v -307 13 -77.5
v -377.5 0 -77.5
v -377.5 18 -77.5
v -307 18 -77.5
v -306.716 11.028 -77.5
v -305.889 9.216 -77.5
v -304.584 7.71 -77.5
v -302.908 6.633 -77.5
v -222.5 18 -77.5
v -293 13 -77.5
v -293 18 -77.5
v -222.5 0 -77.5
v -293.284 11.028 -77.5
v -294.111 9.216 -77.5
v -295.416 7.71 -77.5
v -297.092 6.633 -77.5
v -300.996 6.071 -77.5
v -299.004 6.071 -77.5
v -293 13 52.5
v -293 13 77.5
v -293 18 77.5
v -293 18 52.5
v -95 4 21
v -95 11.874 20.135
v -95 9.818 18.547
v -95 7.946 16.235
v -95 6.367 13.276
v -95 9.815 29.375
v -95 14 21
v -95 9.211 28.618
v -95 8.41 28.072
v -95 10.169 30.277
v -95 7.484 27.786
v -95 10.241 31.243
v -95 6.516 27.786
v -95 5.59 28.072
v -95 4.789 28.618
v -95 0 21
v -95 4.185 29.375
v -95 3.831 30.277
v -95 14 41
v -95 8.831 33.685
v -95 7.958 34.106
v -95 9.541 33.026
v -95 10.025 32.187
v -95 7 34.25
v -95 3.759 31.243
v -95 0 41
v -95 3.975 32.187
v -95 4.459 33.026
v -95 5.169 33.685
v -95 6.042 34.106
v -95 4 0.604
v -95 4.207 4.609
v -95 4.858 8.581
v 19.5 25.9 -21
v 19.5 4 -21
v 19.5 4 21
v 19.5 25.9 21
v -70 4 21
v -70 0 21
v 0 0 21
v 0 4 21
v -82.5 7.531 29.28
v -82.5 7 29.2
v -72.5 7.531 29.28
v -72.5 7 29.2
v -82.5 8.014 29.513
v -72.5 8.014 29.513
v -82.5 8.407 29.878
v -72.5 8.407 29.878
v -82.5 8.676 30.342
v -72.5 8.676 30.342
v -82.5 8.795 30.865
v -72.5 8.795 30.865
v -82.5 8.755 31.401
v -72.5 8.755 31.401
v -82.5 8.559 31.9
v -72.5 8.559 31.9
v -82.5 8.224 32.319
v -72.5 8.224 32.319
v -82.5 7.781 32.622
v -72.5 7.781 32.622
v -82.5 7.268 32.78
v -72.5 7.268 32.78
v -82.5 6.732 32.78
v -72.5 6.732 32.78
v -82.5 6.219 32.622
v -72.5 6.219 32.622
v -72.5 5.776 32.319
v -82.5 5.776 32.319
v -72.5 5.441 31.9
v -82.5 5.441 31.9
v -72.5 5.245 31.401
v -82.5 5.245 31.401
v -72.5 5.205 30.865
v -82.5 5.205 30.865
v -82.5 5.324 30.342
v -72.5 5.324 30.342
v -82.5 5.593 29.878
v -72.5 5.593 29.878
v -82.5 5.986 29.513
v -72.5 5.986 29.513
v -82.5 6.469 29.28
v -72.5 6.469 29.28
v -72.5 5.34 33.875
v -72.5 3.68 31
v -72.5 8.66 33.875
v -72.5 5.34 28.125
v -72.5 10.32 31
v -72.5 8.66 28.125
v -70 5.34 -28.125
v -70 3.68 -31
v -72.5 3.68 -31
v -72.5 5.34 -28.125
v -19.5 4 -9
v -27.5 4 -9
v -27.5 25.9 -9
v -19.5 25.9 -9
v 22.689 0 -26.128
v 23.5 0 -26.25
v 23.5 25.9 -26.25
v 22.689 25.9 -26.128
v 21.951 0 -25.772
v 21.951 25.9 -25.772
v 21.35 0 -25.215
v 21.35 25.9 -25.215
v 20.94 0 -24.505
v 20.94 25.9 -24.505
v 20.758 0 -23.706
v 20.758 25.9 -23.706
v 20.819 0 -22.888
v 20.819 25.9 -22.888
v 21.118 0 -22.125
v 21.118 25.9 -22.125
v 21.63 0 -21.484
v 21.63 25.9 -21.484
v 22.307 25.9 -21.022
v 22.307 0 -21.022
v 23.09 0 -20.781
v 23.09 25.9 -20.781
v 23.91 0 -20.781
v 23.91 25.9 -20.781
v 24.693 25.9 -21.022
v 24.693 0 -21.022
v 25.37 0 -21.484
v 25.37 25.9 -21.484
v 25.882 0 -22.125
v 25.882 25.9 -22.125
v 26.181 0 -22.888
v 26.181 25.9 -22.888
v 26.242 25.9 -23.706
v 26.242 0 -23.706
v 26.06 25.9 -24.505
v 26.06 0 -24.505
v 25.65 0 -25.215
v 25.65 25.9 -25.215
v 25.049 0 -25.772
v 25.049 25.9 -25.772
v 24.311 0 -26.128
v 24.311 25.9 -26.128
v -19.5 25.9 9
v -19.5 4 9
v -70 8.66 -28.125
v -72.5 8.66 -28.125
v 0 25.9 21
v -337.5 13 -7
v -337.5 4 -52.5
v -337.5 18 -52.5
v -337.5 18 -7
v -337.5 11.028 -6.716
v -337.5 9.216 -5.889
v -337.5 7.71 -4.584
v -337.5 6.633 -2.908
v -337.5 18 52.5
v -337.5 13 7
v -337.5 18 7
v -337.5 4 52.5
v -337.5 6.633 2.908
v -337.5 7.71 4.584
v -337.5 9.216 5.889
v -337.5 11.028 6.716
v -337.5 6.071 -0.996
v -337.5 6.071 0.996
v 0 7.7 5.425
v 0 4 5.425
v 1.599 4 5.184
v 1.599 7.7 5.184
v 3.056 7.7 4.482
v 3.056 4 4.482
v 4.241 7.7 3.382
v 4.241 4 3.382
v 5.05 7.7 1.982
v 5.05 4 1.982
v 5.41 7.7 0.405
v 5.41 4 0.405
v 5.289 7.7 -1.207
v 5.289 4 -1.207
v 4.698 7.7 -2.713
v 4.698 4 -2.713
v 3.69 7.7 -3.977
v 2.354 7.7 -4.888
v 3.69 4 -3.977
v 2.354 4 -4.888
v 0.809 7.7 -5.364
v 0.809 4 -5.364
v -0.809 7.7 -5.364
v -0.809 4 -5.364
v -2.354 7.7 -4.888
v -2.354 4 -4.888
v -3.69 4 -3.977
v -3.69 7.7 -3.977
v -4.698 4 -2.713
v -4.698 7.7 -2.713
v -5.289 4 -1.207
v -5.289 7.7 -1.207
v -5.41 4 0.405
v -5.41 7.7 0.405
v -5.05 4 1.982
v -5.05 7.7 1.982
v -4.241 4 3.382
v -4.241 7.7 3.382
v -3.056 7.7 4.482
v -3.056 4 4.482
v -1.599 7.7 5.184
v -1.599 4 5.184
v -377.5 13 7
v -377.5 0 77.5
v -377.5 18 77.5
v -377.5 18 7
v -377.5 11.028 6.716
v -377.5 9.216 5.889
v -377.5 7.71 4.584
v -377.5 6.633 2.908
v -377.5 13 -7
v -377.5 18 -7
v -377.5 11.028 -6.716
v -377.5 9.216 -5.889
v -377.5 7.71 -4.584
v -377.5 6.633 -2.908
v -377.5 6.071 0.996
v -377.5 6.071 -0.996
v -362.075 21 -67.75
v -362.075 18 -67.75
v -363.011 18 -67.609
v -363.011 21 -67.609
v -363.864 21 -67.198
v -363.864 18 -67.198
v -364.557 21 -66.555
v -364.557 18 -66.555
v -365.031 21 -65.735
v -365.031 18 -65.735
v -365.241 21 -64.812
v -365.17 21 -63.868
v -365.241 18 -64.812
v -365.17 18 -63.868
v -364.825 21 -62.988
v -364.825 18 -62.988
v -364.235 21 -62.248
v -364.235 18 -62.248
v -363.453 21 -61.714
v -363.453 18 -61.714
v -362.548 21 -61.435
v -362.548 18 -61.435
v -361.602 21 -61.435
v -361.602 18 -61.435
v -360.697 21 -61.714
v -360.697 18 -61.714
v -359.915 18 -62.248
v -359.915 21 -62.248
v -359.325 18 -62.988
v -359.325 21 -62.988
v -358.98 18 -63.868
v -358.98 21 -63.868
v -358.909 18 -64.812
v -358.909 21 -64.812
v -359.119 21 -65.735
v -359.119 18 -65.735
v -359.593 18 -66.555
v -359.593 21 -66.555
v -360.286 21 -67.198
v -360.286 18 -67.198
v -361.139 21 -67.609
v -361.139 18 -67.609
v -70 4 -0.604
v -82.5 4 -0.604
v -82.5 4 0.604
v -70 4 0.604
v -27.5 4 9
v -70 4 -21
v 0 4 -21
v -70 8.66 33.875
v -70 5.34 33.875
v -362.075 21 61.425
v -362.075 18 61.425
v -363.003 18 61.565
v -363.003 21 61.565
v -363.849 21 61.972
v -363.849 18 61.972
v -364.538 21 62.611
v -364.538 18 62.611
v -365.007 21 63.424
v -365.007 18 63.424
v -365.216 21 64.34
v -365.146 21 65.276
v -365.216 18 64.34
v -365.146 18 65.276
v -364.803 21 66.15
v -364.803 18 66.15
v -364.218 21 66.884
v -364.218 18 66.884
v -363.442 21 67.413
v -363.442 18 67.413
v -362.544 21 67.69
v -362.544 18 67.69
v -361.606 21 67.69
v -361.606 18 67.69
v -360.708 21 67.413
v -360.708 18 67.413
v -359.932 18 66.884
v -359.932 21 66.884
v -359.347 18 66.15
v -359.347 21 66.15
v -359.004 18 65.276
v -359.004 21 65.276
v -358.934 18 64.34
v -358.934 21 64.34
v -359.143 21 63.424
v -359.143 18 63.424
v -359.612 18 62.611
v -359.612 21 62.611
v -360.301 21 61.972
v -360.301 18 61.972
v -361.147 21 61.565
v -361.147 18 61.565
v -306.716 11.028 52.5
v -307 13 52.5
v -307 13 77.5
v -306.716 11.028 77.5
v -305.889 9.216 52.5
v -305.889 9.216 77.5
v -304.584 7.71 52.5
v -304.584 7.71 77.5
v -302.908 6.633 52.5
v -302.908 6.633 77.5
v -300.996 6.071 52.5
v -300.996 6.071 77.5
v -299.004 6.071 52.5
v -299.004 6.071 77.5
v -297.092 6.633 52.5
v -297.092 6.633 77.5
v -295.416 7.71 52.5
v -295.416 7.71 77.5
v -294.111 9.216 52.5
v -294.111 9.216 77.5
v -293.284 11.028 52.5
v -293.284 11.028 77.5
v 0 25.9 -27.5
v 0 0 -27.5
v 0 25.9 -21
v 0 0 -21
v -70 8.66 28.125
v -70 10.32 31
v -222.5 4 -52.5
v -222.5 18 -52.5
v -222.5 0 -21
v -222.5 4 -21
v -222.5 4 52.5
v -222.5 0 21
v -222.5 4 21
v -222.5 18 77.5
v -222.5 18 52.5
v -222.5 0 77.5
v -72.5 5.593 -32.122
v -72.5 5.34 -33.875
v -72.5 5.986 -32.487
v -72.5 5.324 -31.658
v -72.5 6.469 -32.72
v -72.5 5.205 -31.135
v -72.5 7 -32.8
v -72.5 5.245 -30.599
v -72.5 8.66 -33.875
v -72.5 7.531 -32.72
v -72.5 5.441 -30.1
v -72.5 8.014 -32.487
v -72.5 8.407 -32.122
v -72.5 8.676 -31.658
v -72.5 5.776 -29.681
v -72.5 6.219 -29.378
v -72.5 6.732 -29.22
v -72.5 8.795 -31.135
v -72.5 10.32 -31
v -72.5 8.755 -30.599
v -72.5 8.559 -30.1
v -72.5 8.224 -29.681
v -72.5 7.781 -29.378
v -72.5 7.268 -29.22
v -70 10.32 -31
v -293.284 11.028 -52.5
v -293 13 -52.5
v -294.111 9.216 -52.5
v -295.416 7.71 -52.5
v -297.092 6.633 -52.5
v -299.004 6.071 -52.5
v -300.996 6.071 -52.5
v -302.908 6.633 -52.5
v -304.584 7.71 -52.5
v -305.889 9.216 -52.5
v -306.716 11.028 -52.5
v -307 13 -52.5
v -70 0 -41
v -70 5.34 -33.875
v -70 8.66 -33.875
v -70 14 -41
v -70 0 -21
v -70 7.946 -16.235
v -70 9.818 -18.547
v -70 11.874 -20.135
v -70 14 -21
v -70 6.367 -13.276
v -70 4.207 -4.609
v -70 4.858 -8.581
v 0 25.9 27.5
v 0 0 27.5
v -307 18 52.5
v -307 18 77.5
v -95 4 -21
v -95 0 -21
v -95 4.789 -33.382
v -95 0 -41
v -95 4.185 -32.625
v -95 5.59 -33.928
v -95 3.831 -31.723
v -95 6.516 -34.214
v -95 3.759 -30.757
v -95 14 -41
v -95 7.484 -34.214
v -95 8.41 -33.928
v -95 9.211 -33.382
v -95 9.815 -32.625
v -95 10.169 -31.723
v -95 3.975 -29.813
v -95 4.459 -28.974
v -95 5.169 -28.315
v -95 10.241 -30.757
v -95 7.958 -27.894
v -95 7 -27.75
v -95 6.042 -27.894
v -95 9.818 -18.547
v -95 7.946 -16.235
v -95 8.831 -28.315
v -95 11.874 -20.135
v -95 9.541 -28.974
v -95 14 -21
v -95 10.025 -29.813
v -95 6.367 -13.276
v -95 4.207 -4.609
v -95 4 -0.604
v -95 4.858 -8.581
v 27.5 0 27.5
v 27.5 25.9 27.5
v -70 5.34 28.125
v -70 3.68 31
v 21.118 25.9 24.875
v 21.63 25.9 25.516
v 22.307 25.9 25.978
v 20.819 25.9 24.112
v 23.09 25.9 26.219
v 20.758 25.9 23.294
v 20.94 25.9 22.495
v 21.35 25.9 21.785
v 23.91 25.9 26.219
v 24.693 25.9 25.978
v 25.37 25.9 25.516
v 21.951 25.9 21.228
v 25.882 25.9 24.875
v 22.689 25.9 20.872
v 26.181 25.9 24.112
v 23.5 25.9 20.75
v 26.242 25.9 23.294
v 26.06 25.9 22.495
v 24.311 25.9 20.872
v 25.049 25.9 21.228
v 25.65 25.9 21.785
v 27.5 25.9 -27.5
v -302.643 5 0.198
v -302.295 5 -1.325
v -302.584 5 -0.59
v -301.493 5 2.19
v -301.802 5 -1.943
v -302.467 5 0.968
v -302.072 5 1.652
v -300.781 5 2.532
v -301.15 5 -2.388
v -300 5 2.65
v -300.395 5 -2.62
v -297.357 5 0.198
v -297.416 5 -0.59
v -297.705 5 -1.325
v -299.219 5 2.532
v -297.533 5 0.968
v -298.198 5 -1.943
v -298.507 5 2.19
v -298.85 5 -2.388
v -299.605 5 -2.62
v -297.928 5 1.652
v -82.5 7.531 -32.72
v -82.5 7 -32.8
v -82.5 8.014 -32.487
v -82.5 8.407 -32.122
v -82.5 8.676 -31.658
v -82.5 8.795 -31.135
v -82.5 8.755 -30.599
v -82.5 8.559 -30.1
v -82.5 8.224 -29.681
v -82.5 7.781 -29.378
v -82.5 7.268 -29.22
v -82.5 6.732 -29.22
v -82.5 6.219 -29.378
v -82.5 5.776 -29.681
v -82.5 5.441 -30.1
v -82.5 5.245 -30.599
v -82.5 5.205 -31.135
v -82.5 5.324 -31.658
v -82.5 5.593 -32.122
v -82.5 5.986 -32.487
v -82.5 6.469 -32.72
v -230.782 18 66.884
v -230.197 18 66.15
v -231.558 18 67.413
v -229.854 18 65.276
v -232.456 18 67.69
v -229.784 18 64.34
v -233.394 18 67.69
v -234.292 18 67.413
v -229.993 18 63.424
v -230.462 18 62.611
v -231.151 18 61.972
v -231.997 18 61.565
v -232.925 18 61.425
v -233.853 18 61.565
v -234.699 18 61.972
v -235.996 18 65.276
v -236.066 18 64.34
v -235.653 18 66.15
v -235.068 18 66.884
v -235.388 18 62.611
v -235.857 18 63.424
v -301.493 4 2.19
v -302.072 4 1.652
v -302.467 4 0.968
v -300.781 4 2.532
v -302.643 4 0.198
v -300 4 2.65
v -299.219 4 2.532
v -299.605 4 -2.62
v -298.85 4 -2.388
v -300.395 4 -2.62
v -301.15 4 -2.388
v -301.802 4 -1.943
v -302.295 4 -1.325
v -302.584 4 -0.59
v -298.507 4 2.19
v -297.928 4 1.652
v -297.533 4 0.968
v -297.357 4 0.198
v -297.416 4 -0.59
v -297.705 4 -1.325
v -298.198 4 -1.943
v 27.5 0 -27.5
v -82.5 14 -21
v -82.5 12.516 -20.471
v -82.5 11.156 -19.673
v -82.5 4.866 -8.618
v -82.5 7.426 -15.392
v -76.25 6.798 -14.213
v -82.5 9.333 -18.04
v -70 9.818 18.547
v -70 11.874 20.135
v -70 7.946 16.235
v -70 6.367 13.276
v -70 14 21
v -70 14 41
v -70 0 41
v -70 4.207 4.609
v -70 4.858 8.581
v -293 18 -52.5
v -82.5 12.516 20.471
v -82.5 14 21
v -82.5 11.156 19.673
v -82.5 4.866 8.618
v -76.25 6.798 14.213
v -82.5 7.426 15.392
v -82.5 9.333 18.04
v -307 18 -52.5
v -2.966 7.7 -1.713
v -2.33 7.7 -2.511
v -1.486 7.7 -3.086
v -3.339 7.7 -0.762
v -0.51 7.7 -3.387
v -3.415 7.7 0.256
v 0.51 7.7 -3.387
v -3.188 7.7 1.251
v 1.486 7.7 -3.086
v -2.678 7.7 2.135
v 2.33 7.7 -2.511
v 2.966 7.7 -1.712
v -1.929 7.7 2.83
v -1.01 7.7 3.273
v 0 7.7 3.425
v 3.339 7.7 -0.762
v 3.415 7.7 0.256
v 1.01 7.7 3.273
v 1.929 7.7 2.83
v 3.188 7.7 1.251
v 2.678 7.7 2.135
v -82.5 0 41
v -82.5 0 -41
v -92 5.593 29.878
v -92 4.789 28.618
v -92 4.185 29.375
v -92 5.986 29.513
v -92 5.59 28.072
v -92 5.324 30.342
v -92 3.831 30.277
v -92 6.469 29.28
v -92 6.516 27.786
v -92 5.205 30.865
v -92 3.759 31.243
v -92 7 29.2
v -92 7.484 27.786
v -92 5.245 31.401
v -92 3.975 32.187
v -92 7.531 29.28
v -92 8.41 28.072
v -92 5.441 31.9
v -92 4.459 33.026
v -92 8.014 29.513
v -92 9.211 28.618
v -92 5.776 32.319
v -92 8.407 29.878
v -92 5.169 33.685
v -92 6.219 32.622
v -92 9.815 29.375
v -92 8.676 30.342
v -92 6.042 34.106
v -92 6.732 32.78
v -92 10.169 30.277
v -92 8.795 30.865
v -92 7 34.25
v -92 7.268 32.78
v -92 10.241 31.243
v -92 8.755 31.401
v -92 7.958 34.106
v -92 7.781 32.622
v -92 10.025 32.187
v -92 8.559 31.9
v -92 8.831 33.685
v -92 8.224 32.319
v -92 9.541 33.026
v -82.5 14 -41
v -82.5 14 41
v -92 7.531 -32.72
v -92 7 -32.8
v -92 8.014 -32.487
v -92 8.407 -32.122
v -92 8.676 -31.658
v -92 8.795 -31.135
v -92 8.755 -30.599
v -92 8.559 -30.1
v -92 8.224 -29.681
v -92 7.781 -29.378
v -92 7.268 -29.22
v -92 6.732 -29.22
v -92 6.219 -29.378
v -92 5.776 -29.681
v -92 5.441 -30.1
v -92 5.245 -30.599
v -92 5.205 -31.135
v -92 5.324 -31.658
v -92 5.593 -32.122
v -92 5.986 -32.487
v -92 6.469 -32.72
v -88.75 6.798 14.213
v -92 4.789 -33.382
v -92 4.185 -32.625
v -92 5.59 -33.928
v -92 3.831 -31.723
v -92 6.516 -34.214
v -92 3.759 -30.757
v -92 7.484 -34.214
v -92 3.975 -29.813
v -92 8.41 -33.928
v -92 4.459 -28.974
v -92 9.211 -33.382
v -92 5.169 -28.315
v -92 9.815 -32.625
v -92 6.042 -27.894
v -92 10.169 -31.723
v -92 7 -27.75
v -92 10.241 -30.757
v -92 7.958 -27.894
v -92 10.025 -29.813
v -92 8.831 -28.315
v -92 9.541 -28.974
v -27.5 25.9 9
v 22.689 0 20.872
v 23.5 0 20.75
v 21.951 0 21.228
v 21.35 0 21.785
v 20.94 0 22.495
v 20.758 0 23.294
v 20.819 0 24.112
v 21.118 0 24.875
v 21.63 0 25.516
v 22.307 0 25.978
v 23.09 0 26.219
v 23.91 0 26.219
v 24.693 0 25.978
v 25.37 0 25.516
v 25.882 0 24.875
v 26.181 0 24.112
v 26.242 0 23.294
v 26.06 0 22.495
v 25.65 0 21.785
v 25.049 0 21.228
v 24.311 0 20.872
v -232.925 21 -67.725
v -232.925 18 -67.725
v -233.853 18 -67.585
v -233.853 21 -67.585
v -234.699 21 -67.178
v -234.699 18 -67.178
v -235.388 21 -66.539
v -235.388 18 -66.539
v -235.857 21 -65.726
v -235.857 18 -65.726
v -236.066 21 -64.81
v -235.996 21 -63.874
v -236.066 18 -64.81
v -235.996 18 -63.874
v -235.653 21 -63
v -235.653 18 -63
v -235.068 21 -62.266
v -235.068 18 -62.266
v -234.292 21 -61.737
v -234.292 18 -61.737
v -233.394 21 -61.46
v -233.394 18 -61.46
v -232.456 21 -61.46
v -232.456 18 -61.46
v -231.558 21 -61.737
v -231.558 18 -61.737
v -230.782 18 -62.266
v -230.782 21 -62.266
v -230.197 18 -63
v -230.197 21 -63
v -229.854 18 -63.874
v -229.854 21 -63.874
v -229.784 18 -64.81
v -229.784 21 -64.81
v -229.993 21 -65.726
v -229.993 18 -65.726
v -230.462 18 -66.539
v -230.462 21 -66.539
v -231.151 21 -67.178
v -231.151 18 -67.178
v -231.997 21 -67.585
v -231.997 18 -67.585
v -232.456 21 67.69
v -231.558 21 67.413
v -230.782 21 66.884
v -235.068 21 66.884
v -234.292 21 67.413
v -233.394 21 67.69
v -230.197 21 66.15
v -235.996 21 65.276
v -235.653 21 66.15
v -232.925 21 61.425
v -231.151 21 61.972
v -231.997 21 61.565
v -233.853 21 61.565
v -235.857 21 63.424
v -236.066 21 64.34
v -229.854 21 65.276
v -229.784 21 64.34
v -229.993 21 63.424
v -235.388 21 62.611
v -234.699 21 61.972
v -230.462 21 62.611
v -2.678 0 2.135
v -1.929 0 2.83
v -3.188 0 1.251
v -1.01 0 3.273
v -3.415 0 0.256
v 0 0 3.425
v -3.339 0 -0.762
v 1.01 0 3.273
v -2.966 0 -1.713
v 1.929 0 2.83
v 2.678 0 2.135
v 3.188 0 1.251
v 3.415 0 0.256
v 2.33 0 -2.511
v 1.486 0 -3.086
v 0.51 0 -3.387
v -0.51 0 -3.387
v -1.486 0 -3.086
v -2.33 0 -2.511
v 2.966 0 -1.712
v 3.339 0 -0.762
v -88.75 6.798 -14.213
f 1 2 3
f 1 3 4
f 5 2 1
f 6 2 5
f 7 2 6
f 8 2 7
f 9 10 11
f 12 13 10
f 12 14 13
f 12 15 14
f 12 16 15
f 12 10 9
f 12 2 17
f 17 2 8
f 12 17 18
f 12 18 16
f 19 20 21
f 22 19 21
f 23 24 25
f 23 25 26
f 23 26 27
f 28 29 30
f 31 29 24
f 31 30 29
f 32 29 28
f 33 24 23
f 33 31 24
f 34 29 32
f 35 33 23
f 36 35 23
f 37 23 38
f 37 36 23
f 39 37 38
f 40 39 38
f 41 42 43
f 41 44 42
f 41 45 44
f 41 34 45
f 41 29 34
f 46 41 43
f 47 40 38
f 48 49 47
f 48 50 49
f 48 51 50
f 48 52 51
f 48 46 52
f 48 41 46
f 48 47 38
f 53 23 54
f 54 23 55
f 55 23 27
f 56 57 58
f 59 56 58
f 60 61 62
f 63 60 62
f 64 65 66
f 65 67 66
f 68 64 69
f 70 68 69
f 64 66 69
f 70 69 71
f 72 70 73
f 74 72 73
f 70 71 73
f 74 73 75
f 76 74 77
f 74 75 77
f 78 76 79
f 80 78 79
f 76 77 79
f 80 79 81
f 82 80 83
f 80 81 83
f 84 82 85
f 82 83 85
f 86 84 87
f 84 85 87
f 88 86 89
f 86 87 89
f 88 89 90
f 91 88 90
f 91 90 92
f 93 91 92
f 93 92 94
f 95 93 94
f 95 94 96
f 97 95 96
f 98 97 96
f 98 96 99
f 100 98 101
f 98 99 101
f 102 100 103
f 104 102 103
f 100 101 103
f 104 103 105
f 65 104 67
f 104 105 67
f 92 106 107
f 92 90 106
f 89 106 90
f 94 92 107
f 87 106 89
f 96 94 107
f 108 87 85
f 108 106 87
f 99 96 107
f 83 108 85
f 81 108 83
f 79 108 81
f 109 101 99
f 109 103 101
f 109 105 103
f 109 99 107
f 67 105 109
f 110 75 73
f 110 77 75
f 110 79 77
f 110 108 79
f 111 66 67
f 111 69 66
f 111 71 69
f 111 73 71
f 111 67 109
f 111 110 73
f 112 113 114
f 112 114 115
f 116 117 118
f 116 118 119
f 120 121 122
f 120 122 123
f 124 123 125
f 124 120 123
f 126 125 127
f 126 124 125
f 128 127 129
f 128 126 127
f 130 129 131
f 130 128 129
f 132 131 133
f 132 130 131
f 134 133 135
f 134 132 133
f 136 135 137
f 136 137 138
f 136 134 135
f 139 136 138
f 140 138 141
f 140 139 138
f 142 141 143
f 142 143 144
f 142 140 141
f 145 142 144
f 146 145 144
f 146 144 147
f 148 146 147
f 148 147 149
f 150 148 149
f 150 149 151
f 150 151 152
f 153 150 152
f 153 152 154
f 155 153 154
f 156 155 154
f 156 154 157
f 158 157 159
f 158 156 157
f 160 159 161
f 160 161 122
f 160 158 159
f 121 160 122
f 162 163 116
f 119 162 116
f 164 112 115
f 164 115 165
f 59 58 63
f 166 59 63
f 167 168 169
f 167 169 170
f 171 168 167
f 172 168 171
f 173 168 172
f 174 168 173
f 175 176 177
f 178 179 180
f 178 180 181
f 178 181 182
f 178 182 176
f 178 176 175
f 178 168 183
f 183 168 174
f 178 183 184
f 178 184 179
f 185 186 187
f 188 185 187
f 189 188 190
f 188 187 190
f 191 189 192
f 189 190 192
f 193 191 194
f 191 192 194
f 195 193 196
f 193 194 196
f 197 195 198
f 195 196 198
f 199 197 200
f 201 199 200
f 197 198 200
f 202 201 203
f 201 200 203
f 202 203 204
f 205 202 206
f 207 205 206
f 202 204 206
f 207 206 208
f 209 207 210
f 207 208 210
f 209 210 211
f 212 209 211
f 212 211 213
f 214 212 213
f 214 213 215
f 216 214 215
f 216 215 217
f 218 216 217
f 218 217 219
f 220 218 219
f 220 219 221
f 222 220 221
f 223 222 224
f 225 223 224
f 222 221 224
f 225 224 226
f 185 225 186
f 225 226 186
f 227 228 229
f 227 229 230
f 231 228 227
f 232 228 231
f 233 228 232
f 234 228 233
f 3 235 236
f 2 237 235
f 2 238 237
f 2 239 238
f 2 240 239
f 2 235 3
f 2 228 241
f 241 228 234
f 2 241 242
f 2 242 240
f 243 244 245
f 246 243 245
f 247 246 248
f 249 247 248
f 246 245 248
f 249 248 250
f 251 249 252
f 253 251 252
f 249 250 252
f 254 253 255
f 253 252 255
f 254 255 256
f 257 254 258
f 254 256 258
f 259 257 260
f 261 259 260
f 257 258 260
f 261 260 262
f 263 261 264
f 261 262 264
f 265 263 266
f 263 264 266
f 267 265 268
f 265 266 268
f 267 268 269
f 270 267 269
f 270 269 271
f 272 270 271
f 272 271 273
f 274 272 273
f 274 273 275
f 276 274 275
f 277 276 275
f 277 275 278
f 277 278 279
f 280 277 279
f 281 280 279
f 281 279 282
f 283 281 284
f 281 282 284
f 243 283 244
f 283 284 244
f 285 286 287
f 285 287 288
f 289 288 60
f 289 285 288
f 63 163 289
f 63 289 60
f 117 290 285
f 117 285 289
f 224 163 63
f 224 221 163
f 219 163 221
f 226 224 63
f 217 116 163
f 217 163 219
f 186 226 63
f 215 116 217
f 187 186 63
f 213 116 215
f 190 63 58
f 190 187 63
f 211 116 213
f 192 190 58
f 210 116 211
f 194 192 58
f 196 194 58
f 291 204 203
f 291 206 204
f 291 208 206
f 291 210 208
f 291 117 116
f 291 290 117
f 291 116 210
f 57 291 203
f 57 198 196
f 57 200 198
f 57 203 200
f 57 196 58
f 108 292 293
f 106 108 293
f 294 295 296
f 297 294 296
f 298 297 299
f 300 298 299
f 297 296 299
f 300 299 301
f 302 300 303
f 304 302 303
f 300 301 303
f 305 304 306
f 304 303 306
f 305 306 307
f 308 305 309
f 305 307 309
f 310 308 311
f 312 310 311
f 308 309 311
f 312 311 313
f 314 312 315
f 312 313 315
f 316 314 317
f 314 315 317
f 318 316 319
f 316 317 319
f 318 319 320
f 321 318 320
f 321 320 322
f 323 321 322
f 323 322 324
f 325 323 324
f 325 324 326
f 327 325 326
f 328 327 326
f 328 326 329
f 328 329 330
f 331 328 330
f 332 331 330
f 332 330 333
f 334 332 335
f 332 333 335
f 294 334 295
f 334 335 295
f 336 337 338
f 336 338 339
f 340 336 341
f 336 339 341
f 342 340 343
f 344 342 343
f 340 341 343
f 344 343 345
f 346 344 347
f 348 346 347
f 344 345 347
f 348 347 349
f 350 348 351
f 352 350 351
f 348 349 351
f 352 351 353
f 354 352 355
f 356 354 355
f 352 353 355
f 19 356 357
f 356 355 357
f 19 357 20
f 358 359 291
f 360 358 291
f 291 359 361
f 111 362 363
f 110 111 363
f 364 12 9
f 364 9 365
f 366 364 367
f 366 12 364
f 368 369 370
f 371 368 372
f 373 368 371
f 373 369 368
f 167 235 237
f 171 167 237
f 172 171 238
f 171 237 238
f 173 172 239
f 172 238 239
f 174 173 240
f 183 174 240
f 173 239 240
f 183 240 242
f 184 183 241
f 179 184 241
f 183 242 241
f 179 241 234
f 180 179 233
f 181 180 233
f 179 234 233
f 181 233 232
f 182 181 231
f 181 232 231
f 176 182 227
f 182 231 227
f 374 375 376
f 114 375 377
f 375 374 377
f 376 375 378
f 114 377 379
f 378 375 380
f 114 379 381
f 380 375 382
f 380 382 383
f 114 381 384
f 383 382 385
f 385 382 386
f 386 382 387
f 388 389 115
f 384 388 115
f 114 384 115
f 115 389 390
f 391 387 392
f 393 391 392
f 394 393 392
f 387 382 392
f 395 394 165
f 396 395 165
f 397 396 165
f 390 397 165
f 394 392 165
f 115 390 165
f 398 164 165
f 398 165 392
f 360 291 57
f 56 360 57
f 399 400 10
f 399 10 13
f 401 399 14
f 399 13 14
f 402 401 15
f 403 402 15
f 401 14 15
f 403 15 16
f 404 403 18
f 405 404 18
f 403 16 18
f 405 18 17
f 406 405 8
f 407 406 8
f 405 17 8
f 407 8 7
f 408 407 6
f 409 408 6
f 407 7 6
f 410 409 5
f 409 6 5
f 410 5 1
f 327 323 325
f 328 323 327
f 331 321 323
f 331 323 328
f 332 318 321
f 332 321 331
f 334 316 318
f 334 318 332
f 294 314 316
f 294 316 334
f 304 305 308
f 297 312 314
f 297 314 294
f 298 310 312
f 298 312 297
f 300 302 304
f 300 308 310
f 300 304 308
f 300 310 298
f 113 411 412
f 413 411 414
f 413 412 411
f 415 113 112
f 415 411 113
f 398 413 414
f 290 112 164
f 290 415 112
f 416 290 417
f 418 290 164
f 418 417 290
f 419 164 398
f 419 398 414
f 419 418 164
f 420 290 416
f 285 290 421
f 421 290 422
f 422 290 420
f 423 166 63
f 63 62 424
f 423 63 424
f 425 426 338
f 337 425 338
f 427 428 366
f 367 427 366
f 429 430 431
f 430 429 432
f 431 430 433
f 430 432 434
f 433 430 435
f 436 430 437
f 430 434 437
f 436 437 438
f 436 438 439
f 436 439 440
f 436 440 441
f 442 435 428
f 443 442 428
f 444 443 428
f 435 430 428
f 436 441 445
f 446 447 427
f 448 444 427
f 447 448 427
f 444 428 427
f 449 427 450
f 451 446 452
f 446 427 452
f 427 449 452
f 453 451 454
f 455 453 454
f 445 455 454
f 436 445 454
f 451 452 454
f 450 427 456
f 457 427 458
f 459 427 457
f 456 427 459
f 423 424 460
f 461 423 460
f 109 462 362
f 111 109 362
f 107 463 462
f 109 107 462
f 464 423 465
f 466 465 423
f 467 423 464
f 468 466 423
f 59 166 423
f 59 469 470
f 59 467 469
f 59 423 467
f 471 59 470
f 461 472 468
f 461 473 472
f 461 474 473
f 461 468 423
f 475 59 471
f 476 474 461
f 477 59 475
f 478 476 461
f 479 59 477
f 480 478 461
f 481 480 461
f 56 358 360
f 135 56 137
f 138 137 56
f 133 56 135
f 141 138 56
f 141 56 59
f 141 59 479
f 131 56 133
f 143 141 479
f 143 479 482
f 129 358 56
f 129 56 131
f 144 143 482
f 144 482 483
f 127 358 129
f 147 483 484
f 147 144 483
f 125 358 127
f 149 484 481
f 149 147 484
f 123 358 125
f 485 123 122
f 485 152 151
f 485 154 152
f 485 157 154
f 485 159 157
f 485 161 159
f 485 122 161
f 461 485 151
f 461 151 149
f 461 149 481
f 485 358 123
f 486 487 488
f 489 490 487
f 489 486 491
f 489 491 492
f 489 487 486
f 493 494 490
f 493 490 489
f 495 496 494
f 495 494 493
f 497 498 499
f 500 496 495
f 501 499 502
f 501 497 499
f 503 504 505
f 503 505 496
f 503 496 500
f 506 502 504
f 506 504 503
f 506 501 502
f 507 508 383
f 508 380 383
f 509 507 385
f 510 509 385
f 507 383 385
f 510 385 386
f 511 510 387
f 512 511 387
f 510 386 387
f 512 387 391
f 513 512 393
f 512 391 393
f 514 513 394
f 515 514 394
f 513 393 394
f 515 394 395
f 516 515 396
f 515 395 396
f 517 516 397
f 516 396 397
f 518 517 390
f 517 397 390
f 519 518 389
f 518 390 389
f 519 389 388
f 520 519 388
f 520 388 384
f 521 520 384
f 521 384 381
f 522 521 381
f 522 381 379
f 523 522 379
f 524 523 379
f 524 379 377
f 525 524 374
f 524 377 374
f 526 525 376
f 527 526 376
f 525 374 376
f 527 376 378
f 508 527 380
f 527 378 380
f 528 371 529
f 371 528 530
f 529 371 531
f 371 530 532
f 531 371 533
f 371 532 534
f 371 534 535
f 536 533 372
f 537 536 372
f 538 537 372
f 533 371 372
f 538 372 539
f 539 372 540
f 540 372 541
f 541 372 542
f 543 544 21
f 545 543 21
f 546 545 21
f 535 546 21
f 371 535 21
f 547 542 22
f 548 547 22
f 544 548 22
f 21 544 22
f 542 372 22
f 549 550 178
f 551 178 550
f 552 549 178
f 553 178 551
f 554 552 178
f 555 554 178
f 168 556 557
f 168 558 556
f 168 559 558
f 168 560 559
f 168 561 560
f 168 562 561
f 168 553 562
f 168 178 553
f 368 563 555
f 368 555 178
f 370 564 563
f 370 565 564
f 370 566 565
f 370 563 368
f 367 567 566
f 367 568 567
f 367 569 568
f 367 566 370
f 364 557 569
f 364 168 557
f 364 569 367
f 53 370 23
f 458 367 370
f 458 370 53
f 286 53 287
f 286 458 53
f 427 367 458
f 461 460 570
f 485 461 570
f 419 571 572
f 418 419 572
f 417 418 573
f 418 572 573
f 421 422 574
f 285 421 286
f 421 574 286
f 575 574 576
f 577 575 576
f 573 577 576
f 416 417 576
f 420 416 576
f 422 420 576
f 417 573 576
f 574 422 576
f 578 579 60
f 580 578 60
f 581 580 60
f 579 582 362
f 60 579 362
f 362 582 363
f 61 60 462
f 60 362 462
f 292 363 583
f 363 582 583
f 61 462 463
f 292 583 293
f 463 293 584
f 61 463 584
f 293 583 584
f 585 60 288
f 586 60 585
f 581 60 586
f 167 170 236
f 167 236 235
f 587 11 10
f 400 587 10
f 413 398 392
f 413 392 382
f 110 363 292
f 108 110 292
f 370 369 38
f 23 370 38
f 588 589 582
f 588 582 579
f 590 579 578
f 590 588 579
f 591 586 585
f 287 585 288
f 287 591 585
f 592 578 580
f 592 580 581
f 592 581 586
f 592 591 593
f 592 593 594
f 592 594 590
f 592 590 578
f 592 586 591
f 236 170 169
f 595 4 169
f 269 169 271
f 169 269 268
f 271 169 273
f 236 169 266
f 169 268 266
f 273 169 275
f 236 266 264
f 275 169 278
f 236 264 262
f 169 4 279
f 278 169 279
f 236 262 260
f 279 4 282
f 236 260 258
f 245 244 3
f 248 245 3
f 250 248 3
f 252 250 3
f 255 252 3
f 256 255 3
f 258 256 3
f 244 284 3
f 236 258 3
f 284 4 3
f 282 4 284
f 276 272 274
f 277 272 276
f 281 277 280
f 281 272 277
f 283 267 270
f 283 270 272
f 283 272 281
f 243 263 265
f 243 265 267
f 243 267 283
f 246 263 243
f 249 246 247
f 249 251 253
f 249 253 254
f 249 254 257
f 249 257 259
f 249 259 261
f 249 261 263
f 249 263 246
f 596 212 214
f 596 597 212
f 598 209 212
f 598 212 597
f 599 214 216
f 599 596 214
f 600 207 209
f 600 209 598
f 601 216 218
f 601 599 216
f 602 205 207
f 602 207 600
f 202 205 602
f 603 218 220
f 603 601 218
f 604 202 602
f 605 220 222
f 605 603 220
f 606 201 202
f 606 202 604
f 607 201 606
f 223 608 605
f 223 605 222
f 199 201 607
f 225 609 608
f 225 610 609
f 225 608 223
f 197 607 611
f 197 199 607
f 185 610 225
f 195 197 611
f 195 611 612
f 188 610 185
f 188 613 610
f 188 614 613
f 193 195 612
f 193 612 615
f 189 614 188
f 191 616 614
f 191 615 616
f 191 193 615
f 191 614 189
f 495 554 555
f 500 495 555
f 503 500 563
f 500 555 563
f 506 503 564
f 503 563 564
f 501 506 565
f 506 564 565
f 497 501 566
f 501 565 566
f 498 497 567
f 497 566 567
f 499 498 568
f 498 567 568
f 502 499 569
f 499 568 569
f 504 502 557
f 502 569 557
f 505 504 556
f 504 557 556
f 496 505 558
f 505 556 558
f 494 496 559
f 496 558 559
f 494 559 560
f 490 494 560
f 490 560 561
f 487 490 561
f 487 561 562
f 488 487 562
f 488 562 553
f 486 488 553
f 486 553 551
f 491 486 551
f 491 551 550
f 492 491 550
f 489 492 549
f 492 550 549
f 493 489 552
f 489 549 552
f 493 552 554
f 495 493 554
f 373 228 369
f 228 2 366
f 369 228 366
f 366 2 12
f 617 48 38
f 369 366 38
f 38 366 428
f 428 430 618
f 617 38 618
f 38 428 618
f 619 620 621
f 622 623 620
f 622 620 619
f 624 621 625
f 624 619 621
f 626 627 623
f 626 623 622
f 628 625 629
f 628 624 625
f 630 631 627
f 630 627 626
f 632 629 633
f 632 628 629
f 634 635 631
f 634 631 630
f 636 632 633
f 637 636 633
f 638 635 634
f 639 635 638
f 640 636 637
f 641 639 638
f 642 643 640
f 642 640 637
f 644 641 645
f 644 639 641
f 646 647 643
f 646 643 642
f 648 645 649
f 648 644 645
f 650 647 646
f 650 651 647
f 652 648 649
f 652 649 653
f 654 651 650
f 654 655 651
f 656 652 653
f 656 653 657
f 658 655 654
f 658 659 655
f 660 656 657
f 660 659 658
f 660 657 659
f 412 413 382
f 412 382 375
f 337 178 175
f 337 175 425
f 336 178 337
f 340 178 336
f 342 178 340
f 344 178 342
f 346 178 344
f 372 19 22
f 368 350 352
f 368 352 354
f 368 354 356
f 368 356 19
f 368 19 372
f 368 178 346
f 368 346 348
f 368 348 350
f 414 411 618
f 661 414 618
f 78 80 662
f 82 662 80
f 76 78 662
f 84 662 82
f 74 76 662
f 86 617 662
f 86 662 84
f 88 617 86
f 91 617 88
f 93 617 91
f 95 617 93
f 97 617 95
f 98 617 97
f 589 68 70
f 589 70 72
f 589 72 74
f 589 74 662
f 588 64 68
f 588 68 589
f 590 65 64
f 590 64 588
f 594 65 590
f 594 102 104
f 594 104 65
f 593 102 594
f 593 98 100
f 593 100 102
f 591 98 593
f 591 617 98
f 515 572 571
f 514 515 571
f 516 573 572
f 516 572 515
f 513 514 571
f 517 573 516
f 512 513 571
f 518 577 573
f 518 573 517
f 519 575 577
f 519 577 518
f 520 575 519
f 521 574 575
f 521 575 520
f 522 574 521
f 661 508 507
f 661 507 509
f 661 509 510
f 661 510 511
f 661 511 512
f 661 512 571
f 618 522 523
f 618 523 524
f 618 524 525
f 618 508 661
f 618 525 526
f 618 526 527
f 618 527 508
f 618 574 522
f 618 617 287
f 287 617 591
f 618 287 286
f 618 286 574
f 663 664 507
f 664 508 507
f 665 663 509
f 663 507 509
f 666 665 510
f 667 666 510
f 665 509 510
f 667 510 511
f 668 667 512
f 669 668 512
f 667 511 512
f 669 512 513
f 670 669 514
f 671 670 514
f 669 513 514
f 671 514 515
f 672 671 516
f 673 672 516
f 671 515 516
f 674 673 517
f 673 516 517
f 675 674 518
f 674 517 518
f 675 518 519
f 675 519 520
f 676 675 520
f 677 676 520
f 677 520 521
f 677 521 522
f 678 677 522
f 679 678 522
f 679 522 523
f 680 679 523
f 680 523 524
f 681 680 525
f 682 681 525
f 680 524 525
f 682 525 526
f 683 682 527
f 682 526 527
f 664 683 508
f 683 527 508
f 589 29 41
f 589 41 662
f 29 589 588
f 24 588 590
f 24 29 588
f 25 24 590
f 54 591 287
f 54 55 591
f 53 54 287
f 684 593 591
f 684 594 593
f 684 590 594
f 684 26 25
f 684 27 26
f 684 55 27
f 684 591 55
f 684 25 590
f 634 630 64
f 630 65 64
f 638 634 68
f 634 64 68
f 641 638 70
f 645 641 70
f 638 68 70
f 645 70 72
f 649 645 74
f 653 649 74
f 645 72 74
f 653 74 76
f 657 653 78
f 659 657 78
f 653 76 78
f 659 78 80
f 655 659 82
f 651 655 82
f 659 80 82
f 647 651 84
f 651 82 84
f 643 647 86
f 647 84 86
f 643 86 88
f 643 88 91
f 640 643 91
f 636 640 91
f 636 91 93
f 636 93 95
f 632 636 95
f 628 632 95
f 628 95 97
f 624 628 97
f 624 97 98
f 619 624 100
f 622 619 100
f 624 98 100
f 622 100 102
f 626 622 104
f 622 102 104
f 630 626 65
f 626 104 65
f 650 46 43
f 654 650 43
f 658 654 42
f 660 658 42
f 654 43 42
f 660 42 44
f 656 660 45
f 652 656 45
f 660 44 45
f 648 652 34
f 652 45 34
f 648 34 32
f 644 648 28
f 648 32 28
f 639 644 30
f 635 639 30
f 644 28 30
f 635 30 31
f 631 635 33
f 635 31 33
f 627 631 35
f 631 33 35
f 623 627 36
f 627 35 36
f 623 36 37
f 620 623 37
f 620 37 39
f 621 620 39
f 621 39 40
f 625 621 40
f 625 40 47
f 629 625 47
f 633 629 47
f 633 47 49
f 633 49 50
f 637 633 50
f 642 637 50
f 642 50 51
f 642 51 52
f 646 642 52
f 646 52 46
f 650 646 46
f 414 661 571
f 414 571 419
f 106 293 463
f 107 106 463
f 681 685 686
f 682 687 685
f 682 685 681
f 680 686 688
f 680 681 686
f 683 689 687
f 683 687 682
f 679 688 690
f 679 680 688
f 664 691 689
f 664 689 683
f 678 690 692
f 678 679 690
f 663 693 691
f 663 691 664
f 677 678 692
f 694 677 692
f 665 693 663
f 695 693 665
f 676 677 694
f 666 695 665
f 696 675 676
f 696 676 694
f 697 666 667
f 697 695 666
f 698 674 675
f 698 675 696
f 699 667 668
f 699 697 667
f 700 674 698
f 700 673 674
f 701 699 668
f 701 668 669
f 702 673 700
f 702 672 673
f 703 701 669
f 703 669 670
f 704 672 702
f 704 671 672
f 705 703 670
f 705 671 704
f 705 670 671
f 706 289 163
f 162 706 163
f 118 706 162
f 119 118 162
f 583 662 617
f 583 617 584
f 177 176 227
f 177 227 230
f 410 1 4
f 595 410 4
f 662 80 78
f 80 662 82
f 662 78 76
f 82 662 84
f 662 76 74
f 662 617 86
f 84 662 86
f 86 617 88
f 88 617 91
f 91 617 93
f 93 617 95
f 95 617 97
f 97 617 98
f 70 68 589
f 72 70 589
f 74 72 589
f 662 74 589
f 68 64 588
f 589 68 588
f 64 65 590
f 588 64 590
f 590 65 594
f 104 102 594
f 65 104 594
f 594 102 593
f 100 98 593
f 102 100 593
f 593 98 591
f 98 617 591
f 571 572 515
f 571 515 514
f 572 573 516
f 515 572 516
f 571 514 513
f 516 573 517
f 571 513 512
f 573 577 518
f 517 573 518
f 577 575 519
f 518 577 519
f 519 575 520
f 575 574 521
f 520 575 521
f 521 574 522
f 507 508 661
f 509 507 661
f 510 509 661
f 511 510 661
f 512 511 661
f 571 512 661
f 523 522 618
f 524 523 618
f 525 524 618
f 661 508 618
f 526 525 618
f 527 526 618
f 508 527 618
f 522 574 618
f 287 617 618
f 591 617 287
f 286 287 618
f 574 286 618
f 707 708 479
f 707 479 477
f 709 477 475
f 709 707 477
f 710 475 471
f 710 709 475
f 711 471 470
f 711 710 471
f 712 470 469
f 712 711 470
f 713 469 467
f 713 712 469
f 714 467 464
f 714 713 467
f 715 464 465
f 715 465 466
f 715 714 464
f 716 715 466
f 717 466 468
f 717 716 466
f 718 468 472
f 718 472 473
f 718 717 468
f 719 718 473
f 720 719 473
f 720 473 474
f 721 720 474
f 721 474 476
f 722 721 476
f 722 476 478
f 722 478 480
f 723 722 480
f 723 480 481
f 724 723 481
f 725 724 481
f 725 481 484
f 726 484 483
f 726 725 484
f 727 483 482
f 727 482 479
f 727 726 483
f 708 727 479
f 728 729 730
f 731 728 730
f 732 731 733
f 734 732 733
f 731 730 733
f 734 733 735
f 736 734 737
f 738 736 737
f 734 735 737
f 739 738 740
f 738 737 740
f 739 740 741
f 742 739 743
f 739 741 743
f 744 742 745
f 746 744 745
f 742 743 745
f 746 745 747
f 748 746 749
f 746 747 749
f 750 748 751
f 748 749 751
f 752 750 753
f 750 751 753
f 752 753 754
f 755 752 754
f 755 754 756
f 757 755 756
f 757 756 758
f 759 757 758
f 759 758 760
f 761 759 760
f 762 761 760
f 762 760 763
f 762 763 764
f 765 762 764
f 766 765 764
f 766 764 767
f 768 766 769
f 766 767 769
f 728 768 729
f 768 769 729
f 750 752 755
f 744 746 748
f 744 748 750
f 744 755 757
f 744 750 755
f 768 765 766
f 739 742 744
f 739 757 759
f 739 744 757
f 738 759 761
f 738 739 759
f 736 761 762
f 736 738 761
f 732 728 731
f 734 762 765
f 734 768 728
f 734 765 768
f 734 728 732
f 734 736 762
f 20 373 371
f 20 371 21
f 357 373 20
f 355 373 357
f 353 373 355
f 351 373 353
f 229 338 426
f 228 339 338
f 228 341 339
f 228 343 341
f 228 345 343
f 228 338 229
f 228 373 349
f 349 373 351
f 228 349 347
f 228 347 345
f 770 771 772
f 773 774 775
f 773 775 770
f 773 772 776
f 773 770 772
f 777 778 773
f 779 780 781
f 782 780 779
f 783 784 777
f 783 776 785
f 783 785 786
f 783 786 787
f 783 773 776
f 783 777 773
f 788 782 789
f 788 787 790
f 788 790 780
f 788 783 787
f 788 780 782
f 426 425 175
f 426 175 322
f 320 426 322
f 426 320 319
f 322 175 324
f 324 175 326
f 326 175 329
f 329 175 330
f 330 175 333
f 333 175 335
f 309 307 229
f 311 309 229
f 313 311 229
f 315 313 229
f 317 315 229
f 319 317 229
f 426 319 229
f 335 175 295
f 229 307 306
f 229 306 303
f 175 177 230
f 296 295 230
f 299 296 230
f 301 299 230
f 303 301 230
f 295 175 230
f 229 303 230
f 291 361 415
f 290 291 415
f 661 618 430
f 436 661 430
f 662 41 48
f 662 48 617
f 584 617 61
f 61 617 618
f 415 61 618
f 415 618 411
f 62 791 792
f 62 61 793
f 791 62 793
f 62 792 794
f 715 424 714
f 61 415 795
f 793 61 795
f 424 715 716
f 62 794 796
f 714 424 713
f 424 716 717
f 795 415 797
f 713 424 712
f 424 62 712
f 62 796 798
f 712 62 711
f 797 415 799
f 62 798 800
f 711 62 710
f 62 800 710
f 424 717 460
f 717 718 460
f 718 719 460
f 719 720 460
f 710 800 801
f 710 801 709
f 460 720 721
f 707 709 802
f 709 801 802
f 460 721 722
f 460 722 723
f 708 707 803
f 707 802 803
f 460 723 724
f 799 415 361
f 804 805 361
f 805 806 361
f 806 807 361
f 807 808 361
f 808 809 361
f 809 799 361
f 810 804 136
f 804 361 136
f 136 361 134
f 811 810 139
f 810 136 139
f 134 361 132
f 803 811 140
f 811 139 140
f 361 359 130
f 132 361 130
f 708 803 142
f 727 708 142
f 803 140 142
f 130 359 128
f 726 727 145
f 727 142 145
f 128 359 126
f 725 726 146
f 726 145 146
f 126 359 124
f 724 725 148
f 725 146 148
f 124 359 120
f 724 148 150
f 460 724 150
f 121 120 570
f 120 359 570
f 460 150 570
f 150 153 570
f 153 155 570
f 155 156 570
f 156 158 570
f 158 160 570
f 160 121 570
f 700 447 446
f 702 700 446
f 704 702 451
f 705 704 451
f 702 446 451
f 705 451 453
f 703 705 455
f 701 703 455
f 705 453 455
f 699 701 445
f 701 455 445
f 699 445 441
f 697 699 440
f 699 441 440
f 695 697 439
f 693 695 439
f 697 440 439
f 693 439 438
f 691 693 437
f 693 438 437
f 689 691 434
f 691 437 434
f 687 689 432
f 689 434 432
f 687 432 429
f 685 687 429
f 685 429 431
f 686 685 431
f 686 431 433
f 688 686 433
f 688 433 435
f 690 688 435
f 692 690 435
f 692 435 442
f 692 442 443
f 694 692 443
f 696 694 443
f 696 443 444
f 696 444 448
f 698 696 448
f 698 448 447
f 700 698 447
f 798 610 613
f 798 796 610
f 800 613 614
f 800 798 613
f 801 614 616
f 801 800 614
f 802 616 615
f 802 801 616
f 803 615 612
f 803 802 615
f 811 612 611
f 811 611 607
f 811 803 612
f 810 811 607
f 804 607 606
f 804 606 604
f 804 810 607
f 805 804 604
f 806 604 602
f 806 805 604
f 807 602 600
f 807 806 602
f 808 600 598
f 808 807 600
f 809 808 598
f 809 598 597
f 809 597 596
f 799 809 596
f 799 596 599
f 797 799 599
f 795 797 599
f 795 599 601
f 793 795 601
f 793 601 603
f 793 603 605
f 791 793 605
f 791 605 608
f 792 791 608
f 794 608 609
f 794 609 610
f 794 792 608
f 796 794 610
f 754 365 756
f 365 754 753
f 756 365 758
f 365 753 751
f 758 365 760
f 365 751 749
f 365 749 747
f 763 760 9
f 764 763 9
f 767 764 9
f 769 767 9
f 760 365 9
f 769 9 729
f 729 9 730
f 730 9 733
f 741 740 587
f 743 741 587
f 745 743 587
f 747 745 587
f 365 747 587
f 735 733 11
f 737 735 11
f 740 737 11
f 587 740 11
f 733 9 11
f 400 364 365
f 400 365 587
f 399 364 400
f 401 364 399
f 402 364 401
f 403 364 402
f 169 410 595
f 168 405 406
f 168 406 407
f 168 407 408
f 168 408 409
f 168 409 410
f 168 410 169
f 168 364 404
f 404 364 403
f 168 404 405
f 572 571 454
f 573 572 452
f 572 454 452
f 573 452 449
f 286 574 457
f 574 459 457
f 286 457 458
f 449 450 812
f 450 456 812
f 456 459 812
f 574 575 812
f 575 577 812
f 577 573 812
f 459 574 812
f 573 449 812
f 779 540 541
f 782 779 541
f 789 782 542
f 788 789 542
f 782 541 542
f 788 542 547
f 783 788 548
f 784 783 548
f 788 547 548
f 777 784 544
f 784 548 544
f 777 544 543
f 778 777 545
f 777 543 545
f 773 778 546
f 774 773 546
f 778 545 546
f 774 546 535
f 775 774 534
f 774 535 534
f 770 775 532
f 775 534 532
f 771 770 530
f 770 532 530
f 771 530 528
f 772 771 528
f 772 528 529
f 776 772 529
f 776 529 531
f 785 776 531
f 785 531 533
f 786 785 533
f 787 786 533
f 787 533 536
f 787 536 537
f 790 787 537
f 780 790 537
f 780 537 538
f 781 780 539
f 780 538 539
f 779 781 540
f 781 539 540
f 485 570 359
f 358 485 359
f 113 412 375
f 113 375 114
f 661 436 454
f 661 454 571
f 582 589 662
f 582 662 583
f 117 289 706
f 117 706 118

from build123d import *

# Parameters (mm, degrees)
SKETCH1_W                      = 8
SKETCH1_H                      = 18
SKETCH1_R                      = 3.425
BOSS_EXTRUDE1_DEPTH            = 4
SKETCH1_3_R                    = 2.75
SKETCH1_3_W                    = 8
SKETCH1_3_H                    = 18
BOSS_EXTRUDE2_DEPTH            = 25.9
SKETCH4_R                      = 5.425
SKETCH4_R_2                    = 3.425
BOSS_EXTRUDE5_DEPTH            = 3.7
BOSS_EXTRUDE6_DEPTH            = 14
SKETCH6_R                      = 3.15
SKETCH6_R_2                    = 3.175
BOSS_EXTRUDE7_DEPTH            = 3
SKETCH7_R                      = 2.65
BOSS_EXTRUDE8_DEPTH            = 1
CUT_EXTRUDE1_DEPTH             = 40
CIRPATTERN1_COUNT              = 4
SKETCH12_W                     = 12.5
SKETCH12_H                     = 20
BOSS_EXTRUDE9_DEPTH            = 4
SKETCH12_3_W                   = 12.5
SKETCH12_3_H                   = 20
BOSS_EXTRUDE10_DEPTH           = 10
FILLET3_START                  = -95
FILLET3_DEPTH                  = 25
CUT_EXTRUDE2_DEPTH             = 2.5
CBORE_FOR_M3_SHCS1_D           = 3.6
CBORE_FOR_M3_SHCS1_DEPTH       = 22.5
CBORE_FOR_M3_SHCS1_CBORE_D     = 6.5
CBORE_FOR_M3_SHCS1_CBORE_DEPTH = 3


with BuildPart() as part:
    # Sketch1 → Boss-Extrude1 (new body)
    with BuildSketch(Plane(origin=(0, 0, 0), x_dir=(1, 0, 0), z_dir=(0, 1, 0))):
        Polygon((-222.5, -21), (0, -21), (19.5, -21), (19.5, 21), (0, 21), (-222.5, 21), (-222.5, 77.5), (-377.5, 77.5), (-377.5, -77.5), (-222.5, -77.5), align=None)
        with Locations((-23.5, 0)):
            Rectangle(SKETCH1_W, SKETCH1_H, mode=Mode.SUBTRACT)
        with Locations(Location((0, 0, 0), (0, 0, 270))):
            Circle(SKETCH1_R, mode=Mode.SUBTRACT)
    extrude(amount=BOSS_EXTRUDE1_DEPTH)

    # Sketch1<3> → Boss-Extrude2 (add)
    # profile 1 of 2: a face of its own
    with BuildSketch(Plane(origin=(0, 0, 0), x_dir=(1, 0, 0), z_dir=(0, 1, 0))):
        Polygon((27.5, -27.5), (27.5, 27.5), (0, 27.5), (0, 21), (19.5, 21), (19.5, -21), (0, -21), (0, -27.5), align=None)
        with Locations(Location((23.5, 23.5, 0), (0, 0, 90))):
            Circle(SKETCH1_3_R, mode=Mode.SUBTRACT)
        with Locations(Location((23.5, -23.5, 0), (0, 0, 90))):
            Circle(SKETCH1_3_R, mode=Mode.SUBTRACT)
    # profile 2 of 2: a face of its own
    with BuildSketch(Plane(origin=(0, 0, 0), x_dir=(1, 0, 0), z_dir=(0, 1, 0))):
        with Locations((-23.5, 0)):
            Rectangle(SKETCH1_3_W, SKETCH1_3_H)
    extrude(amount=BOSS_EXTRUDE2_DEPTH)

    # Sketch4 → Boss-Extrude5 (add)
    with BuildSketch(Plane(origin=(0, 4, 0), x_dir=(1, 0, 0), z_dir=(0, 1, 0))):
        with Locations(Location((0, 0, 0), (0, 0, 270))):
            Circle(SKETCH4_R)
        with Locations(Location((0, 0, 0), (0, 0, 270))):
            Circle(SKETCH4_R_2, mode=Mode.SUBTRACT)
    extrude(amount=BOSS_EXTRUDE5_DEPTH)

    # Sketch5 → Boss-Extrude6 (add)
    with BuildSketch(Plane(origin=(0, 4, 0), x_dir=(1, 0, 0), z_dir=(0, 1, 0))):
        Polygon((-377.5, 77.5), (-222.5, 77.5), (-222.5, 52.5), (-337.5, 52.5), (-337.5, -52.5), (-222.5, -52.5), (-222.5, -77.5), (-377.5, -77.5), align=None)
    extrude(amount=BOSS_EXTRUDE6_DEPTH)

    # Sketch6 → Boss-Extrude7 (add)
    with BuildSketch(Plane(origin=(0, 18, 0), x_dir=(1, 0, 0), z_dir=(0, 1, 0))):
        with Locations(Location((-232.925, 64.575, 0), (0, 0, 90))):
            Circle(SKETCH6_R)
        with Locations(Location((-232.925, -64.575, 0), (0, 0, 90))):
            Circle(SKETCH6_R)
        with Locations(Location((-362.075, -64.575, 0), (0, 0, 90))):
            Circle(SKETCH6_R)
        with Locations(Location((-362.075, 64.575, 0), (0, 0, 90))):
            Circle(SKETCH6_R_2)
    extrude(amount=BOSS_EXTRUDE7_DEPTH)

    # Sketch7 → Boss-Extrude8 (add)
    with BuildSketch(Plane(origin=(0, 4, 0), x_dir=(1, 0, 0), z_dir=(0, 1, 0))):
        with Locations(Location((-300, 0, 0), (0, 0, 270))):
            Circle(SKETCH7_R)
    extrude(amount=BOSS_EXTRUDE8_DEPTH)

    # Sketch9 → Cut-Extrude1 (cut)
    with BuildSketch(Plane.XY.offset(77.5)):
        with BuildLine():
            Line((-293, 18), (-307, 18))
            Line((-307, 18), (-307, 13))
            ThreePointArc((-307, 13), (-300, 6), (-293, 13))
            Line((-293, 13), (-293, 18))
        make_face()
    cut_extrude1 = extrude(amount=-CUT_EXTRUDE1_DEPTH, mode=Mode.SUBTRACT)

    # CirPattern1: Cut-Extrude1 ×4 about axis
    cirpattern1_axis = Axis((-300, 5, 0), (0, -1, 0))
    for i in range(1, CIRPATTERN1_COUNT):
        add(cut_extrude1.rotate(cirpattern1_axis, i * 360 / CIRPATTERN1_COUNT), mode=Mode.SUBTRACT)

    # Sketch12 → Boss-Extrude9 (add)
    with BuildSketch(Plane(origin=(0, 4, 0), x_dir=(1, 0, 0), z_dir=(0, 1, 0))):
        with Locations((-76.25, -31)):
            Rectangle(SKETCH12_W, SKETCH12_H)
        with Locations((-88.75, -31)):
            Rectangle(SKETCH12_W, SKETCH12_H)
        with Locations((-76.25, 31)):
            Rectangle(SKETCH12_W, SKETCH12_H)
        with Locations((-88.75, 31)):
            Rectangle(SKETCH12_W, SKETCH12_H)
    extrude(amount=-BOSS_EXTRUDE9_DEPTH)

    # Sketch12<3> → Boss-Extrude10 (add)
    with BuildSketch(Plane(origin=(0, 4, 0), x_dir=(1, 0, 0), z_dir=(0, 1, 0))):
        with Locations((-88.75, 31)):
            Rectangle(SKETCH12_3_W, SKETCH12_3_H)
        with Locations((-76.25, 31)):
            Rectangle(SKETCH12_3_W, SKETCH12_3_H)
        with Locations((-88.75, -31)):
            Rectangle(SKETCH12_3_W, SKETCH12_3_H)
        with Locations((-76.25, -31)):
            Rectangle(SKETCH12_3_W, SKETCH12_3_H)
    extrude(amount=BOSS_EXTRUDE10_DEPTH)

    # Fillet3: read off the stored shape, not the designer's step
    # Fillet3 outline → Fillet3 (add)
    with BuildSketch(Plane.YZ.offset(FILLET3_START)):
        with BuildLine():
            add(Edge.make_bspline(
                [(14, -21), (4, -18.548548311), (4, -0.603921946)],
                knots=[0, 0, 0, 1, 1, 1], degree=2, weights=[1, 0.786795792, 1]))
            Line((4, -0.603921946), (4, -21))
            Line((4, -21), (14, -21))
        make_face()
        with BuildLine():
            add(Edge.make_bspline(
                [(14, 21), (4, 18.548548311), (4, 0.603921946)],
                knots=[0, 0, 0, 1, 1, 1], degree=2, weights=[1, 0.786795792, 1]))
            Line((14, 21), (4, 21))
            Line((4, 21), (4, 0.603921946))
        make_face()
    extrude(amount=FILLET3_DEPTH)

    # Sketch14 → Cut-Extrude2 (cut)
    with BuildSketch(Plane(origin=(-70, 0, 0), x_dir=(0, 0, -1), z_dir=(1, 0, 0))):
        Polygon((-31, 3.680235952), (-28.125, 5.340117976), (-28.125, 8.659882024), (-31, 10.319764048), (-33.875, 8.659882024), (-33.875, 5.340117976), align=None)
        Polygon((33.875, 5.340117976), (31, 3.680235952), (28.125, 5.340117976), (28.125, 8.659882024), (31, 10.319764048), (33.875, 8.659882024), align=None)
    extrude(amount=-CUT_EXTRUDE2_DEPTH, mode=Mode.SUBTRACT)

    # CBORE for M3 SHCS1
    with Locations(Plane.ZY.offset(95)):
        with Locations((-31, 7), (31, 7)):
            CounterBoreHole(CBORE_FOR_M3_SHCS1_D / 2, CBORE_FOR_M3_SHCS1_CBORE_D / 2, CBORE_FOR_M3_SHCS1_CBORE_DEPTH, depth=CBORE_FOR_M3_SHCS1_DEPTH)


with BuildPart() as body_2:
    # Split1: the piece on the far side of the plane
    add(part.part)
    split(bisect_by=Plane(origin=(-82.5, 0, 0), x_dir=(0, 0, -1), z_dir=(-1, 0, 0)), keep=Keep.BOTTOM)


with BuildPart() as part_1:
    add(part.part)

    # Split1
    split(bisect_by=Plane(origin=(-82.5, 0, 0), x_dir=(0, 0, -1), z_dir=(-1, 0, 0)), keep=Keep.TOP)


solid = Compound([body_2.part, part_1.part])
